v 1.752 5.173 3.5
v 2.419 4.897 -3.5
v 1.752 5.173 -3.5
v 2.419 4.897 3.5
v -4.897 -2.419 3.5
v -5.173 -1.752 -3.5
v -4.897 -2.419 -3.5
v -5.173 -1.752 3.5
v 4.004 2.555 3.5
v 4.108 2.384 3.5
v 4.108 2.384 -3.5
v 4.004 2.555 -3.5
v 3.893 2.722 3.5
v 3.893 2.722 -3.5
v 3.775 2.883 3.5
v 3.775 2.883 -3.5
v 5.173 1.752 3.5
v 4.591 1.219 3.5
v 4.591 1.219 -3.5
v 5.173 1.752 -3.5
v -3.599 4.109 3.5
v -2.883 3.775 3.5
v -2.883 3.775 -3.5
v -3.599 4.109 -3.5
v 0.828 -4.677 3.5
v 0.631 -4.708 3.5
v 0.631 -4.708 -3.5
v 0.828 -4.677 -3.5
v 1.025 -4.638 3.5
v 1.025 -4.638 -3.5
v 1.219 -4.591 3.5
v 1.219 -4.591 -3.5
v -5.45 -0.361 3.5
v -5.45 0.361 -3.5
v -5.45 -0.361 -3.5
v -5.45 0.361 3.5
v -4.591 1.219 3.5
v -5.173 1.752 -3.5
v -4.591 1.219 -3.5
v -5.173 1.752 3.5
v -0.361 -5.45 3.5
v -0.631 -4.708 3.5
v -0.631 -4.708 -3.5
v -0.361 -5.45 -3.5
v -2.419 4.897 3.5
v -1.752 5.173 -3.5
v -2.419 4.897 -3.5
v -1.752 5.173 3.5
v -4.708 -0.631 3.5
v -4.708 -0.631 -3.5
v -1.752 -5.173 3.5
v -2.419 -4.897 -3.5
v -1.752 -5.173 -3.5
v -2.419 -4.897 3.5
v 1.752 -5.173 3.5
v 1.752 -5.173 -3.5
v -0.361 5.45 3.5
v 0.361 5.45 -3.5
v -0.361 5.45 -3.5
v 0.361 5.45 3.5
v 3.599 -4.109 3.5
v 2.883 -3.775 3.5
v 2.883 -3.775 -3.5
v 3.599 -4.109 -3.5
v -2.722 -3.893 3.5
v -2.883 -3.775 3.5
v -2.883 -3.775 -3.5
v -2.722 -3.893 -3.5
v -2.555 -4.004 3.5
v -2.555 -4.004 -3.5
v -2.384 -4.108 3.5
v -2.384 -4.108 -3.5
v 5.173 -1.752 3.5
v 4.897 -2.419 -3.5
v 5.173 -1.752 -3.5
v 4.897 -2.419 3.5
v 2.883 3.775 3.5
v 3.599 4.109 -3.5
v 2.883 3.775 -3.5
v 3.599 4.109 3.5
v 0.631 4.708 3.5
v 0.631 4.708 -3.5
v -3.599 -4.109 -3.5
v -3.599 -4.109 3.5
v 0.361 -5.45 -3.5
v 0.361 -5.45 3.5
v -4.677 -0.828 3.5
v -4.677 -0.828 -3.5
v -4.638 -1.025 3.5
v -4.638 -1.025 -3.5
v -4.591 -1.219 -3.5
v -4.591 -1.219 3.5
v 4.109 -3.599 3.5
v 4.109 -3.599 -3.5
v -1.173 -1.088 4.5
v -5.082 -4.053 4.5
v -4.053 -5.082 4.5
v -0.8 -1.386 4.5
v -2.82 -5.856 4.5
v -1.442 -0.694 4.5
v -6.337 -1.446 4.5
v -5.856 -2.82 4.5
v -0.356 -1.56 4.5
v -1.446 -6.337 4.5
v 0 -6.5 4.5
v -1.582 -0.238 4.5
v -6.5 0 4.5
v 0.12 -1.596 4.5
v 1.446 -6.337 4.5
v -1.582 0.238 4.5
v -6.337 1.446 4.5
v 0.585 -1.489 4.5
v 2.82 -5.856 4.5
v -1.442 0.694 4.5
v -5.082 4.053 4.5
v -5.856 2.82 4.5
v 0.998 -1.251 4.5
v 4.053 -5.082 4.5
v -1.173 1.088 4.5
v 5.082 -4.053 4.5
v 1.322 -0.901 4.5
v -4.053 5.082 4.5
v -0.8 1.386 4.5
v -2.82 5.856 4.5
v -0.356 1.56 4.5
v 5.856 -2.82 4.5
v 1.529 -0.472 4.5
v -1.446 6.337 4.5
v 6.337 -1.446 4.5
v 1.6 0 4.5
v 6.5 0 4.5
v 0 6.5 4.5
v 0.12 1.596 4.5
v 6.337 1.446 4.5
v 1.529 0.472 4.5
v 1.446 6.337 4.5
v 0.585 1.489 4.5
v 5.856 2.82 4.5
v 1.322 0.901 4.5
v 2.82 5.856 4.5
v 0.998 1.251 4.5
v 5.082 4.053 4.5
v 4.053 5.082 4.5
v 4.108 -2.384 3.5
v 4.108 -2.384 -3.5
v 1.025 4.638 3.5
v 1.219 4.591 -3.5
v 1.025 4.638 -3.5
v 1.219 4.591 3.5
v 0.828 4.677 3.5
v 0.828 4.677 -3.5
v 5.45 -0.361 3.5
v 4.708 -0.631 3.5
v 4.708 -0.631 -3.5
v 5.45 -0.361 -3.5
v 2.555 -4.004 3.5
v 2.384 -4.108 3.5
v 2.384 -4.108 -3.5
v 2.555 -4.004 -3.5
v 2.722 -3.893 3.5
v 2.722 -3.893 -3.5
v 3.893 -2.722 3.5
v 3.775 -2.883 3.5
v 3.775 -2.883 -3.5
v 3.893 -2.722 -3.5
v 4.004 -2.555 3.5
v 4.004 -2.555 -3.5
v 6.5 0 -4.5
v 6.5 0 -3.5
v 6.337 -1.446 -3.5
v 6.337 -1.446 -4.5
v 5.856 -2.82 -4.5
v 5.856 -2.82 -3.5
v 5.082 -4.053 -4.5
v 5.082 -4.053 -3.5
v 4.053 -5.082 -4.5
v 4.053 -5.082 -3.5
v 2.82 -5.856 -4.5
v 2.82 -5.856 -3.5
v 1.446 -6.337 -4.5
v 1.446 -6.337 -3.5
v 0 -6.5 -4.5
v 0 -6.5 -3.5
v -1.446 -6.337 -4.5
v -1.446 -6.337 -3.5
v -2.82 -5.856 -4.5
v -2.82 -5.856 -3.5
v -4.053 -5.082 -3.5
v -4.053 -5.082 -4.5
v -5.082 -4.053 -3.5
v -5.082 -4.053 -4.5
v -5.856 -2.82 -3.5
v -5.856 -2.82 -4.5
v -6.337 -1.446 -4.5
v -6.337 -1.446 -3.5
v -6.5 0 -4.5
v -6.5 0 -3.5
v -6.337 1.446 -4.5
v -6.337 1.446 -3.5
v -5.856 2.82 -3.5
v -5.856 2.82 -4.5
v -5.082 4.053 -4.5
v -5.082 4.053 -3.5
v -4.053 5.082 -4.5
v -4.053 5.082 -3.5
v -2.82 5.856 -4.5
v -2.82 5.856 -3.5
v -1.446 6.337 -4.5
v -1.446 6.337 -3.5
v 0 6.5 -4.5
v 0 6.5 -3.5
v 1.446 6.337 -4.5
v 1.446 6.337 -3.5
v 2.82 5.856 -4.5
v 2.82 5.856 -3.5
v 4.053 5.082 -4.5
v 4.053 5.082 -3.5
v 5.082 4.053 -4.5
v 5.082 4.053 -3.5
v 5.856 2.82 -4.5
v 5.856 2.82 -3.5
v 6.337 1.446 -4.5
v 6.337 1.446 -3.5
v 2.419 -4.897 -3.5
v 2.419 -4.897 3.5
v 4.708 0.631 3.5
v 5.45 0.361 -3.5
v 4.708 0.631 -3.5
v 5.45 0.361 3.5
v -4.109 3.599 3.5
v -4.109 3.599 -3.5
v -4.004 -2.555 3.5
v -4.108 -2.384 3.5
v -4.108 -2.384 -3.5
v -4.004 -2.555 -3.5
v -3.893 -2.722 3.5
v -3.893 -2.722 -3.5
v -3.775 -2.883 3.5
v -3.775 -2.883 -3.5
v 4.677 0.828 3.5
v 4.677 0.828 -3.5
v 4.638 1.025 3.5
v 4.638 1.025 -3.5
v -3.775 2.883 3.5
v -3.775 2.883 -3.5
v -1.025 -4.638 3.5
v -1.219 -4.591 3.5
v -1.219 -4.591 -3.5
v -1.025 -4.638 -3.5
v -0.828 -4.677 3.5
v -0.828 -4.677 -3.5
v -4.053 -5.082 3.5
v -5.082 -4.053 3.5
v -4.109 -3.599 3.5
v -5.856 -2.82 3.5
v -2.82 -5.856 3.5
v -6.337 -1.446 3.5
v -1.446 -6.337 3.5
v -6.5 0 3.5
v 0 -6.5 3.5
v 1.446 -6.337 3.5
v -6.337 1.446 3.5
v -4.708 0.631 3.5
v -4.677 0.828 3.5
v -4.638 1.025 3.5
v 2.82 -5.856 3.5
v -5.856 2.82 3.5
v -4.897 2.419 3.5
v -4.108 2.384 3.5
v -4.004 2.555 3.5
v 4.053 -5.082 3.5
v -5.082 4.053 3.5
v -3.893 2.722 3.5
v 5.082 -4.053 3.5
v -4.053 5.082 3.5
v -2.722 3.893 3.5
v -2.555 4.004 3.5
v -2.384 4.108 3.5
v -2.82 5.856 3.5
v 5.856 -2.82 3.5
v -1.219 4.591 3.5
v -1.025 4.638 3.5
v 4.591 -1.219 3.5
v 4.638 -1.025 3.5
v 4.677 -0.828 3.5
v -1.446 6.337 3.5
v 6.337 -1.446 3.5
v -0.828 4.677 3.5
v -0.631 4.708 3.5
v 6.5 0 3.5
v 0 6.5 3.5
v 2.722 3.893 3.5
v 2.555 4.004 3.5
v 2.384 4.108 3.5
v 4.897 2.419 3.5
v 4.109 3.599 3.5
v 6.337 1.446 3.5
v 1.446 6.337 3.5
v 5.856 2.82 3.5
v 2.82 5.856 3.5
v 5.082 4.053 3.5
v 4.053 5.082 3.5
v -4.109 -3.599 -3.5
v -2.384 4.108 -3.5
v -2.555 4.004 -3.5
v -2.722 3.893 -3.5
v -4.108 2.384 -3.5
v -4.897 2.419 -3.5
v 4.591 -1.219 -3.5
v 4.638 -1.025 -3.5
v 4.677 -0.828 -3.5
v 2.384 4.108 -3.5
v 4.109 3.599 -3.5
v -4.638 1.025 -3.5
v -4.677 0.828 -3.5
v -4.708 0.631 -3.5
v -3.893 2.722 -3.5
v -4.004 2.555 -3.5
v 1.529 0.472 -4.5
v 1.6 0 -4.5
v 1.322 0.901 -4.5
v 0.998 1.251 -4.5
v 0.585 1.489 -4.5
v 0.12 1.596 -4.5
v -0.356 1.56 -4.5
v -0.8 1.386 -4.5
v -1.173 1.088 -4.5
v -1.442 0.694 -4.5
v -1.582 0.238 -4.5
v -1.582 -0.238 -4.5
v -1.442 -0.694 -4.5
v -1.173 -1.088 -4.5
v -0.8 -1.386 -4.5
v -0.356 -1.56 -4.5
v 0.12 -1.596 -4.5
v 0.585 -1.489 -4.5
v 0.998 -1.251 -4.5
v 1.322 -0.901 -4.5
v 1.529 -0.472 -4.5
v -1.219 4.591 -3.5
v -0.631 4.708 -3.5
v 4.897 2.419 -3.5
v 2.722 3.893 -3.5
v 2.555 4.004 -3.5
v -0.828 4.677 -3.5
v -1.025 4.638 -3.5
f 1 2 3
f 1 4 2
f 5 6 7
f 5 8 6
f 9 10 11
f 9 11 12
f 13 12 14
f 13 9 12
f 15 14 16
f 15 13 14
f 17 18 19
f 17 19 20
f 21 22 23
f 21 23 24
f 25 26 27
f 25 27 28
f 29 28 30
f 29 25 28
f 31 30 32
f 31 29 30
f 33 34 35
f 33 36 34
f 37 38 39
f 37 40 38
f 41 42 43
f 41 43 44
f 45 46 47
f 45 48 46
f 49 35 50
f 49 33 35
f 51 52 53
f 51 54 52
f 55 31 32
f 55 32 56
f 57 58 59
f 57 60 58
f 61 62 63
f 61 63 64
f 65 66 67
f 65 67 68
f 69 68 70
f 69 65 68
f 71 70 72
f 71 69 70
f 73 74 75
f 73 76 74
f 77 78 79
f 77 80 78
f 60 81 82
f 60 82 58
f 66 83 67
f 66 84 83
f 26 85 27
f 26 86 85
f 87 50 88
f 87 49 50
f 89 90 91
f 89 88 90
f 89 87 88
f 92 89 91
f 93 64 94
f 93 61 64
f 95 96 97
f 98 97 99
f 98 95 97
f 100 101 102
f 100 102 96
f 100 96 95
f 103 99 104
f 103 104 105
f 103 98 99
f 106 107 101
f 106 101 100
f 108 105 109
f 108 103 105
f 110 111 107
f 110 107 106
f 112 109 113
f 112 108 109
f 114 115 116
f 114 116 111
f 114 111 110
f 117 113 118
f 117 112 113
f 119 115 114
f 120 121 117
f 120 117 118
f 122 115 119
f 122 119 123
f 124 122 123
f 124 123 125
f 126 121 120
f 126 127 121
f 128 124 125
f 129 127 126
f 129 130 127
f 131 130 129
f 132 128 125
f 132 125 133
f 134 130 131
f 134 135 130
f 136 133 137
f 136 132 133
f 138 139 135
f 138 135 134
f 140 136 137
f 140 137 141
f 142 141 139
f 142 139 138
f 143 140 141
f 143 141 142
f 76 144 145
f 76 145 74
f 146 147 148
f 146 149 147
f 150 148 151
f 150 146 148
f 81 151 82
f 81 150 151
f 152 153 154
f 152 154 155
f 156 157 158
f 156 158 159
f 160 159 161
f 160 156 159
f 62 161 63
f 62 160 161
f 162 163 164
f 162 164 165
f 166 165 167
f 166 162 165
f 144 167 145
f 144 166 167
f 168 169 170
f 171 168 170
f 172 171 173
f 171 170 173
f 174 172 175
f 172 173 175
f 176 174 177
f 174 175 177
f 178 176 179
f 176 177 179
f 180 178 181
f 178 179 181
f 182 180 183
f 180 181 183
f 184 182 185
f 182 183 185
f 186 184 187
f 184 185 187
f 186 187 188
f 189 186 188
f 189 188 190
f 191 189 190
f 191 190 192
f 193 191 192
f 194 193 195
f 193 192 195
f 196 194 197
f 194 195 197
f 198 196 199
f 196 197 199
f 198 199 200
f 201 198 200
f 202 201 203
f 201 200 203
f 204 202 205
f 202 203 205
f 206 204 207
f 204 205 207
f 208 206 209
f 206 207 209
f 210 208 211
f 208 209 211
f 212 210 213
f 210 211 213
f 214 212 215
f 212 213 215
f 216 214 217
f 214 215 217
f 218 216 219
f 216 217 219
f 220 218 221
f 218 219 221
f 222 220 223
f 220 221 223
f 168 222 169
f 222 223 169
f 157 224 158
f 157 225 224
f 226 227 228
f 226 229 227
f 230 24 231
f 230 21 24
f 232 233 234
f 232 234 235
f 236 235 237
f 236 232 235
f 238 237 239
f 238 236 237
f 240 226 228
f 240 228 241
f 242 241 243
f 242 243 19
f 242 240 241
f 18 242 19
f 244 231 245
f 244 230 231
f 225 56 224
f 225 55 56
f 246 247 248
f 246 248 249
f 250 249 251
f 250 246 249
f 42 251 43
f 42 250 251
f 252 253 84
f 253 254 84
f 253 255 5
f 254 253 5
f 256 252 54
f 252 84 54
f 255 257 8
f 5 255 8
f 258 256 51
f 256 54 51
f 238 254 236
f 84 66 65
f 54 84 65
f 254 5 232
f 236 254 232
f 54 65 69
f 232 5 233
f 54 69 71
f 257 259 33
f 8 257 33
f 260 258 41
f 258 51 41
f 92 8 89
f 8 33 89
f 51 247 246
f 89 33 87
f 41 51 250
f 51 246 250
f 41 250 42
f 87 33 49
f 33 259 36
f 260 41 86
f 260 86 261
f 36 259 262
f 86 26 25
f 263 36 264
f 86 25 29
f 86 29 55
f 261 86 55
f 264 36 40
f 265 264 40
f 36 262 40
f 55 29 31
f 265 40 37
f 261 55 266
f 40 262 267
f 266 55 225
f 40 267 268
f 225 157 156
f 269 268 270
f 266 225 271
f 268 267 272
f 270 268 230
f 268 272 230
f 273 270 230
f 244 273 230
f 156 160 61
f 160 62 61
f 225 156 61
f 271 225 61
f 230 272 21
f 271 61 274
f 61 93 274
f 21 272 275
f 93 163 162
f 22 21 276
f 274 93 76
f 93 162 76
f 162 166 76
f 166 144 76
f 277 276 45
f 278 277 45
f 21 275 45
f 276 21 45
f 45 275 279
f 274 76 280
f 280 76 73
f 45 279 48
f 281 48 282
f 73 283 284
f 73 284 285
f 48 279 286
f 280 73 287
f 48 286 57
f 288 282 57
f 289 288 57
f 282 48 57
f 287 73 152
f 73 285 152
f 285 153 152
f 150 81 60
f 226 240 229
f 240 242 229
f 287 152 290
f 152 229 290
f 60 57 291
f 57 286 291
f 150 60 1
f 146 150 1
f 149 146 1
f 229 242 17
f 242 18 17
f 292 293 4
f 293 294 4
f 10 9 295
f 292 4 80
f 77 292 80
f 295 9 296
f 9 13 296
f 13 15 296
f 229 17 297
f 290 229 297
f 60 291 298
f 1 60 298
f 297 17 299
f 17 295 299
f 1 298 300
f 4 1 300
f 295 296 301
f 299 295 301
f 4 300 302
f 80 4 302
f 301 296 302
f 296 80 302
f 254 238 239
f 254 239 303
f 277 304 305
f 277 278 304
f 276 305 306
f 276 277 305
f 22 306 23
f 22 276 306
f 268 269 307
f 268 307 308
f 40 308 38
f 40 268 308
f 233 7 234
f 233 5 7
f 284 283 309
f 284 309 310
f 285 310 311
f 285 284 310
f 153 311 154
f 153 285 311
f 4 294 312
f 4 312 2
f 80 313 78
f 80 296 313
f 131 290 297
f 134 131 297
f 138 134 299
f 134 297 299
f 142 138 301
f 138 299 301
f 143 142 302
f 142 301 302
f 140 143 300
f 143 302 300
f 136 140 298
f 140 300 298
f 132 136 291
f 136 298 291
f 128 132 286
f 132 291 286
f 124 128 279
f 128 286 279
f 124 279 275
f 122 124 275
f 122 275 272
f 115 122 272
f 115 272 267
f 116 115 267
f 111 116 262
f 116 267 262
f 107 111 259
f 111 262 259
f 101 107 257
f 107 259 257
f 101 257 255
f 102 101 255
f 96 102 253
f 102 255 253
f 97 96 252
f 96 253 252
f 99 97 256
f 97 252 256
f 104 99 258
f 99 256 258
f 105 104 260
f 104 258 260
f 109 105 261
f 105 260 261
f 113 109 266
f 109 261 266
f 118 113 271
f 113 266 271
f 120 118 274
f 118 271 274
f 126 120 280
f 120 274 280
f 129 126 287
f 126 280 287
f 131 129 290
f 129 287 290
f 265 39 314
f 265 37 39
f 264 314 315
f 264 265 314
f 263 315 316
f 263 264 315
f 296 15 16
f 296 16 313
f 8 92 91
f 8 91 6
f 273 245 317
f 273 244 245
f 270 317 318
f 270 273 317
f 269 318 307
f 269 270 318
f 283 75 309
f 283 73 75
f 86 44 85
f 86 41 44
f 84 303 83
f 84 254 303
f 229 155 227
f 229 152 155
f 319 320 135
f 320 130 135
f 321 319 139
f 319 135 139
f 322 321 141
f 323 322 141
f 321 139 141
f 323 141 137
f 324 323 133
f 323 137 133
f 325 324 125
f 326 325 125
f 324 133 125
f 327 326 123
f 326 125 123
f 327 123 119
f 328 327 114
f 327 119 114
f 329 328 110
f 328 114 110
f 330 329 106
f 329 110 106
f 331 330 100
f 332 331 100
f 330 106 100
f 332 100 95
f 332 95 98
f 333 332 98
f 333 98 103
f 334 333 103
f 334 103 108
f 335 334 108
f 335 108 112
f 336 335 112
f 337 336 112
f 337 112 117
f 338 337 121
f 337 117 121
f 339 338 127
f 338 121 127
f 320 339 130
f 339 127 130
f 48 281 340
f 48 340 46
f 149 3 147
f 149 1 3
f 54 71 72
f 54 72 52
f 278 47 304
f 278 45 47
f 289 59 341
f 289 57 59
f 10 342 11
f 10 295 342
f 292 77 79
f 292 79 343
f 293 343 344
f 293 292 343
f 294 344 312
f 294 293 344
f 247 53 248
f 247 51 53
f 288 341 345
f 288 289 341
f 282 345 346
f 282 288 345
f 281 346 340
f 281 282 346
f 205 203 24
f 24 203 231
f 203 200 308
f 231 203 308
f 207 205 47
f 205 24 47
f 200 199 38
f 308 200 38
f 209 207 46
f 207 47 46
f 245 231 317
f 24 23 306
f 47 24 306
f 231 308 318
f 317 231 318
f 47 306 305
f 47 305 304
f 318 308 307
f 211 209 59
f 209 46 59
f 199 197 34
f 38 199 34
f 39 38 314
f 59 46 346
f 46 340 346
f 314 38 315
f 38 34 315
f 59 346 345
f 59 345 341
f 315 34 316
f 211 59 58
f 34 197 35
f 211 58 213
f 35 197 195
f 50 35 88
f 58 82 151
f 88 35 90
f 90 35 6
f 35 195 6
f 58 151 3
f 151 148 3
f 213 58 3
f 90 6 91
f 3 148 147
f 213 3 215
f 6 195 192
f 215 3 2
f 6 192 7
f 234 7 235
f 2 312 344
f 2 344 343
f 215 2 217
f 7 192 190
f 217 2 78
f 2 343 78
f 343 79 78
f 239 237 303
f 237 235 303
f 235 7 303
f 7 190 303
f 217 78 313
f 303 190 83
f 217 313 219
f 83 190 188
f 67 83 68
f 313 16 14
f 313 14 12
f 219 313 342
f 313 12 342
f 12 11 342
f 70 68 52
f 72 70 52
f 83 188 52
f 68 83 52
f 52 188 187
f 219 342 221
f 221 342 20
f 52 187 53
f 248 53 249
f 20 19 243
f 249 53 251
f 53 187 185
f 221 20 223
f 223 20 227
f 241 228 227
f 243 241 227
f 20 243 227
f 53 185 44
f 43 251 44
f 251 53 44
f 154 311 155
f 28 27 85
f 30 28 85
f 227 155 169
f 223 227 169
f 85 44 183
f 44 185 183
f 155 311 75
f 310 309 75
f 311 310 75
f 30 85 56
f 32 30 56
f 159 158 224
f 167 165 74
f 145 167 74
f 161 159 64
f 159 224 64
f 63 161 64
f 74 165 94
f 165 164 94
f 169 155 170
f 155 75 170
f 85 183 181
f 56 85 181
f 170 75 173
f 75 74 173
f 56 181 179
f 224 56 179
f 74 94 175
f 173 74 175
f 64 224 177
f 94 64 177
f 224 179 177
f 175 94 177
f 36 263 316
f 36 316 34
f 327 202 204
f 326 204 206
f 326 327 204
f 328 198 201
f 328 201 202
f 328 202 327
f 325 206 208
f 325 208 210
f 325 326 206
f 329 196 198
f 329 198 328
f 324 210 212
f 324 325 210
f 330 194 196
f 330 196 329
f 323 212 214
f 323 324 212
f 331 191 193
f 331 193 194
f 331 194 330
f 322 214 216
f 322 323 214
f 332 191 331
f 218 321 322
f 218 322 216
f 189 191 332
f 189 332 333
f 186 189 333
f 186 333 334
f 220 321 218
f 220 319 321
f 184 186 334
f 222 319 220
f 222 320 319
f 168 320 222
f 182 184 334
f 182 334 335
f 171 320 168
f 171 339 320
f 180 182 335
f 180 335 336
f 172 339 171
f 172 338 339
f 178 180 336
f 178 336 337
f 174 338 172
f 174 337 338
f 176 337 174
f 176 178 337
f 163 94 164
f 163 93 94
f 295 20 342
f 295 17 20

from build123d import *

# Parameters (mm, degrees)
F0_R     = 1.6
F1_DEPTH = 3.5
F3_COUNT = 16
F5_R     = 6.5
F6_DEPTH = 1
F7_R     = 6.5
F8_DEPTH = 1
F9_DEPTH = 12.5


with BuildPart() as f1:
    # F0 (on Top) → F1 (new body, symmetric)
    with BuildSketch(Plane.XY):
        with BuildLine():
            ThreePointArc((-0.6307960914, 4.7079290873), (-3.1277962342, -3.5748273689), (4.75, 0))
            ThreePointArc((4.75, 0), (3.5748273689, 3.1277962342), (0.6307960914, 4.7079290873))
            Line((0.6307960914, 4.7079290873), (0.75, 4.3804190402))
            Line((0.75, 4.3804190402), (-0.75, 4.3804190402))
            Line((-0.75, 4.3804190402), (-0.6307960914, 4.7079290873))
        make_face()
        Circle(F0_R, mode=Mode.SUBTRACT)
        with BuildLine():
            ThreePointArc((-0.6307960914, 4.7079290873), (0, 4.75), (0.6307960914, 4.7079290873))
            Line((0.6307960914, 4.7079290873), (0.3607043675, 5.45))
            Line((0.3607043675, 5.45), (-0.3607043675, 5.45))
            Line((-0.3607043675, 5.45), (-0.6307960914, 4.7079290873))
        make_face()
        with BuildLine():
            Line((0.75, 4.3804190402), (0.6307960914, 4.7079290873))
            ThreePointArc((0.6307960914, 4.7079290873), (0, 4.75), (-0.6307960914, 4.7079290873))
            Line((-0.6307960914, 4.7079290873), (-0.75, 4.3804190402))
            Line((-0.75, 4.3804190402), (0.75, 4.3804190402))
        make_face()
    extrude(amount=F1_DEPTH, both=True)


with BuildPart() as f3_1:
    # F3: instance of F1
    add(f1.part.rotate(Axis((0, 0, 0.113066053), (0, 0, -1)), 1 * 360 / F3_COUNT))


with BuildPart() as f3_2:
    # F3: instance of F1
    add(f1.part.rotate(Axis((0, 0, 0.113066053), (0, 0, -1)), 2 * 360 / F3_COUNT))


with BuildPart() as f3_3:
    # F3: instance of F1
    add(f1.part.rotate(Axis((0, 0, 0.113066053), (0, 0, -1)), 3 * 360 / F3_COUNT))


with BuildPart() as f3_4:
    # F3: instance of F1
    add(f1.part.rotate(Axis((0, 0, 0.113066053), (0, 0, -1)), 4 * 360 / F3_COUNT))


with BuildPart() as f3_5:
    # F3: instance of F1
    add(f1.part.rotate(Axis((0, 0, 0.113066053), (0, 0, -1)), 5 * 360 / F3_COUNT))


with BuildPart() as f3_6:
    # F3: instance of F1
    add(f1.part.rotate(Axis((0, 0, 0.113066053), (0, 0, -1)), 6 * 360 / F3_COUNT))


with BuildPart() as f3_7:
    # F3: instance of F1
    add(f1.part.rotate(Axis((0, 0, 0.113066053), (0, 0, -1)), 7 * 360 / F3_COUNT))


with BuildPart() as f3_8:
    # F3: instance of F1
    add(f1.part.rotate(Axis((0, 0, 0.113066053), (0, 0, -1)), 8 * 360 / F3_COUNT))


with BuildPart() as f3_9:
    # F3: instance of F1
    add(f1.part.rotate(Axis((0, 0, 0.113066053), (0, 0, -1)), 9 * 360 / F3_COUNT))


with BuildPart() as f3_10:
    # F3: instance of F1
    add(f1.part.rotate(Axis((0, 0, 0.113066053), (0, 0, -1)), 10 * 360 / F3_COUNT))


with BuildPart() as f3_11:
    # F3: instance of F1
    add(f1.part.rotate(Axis((0, 0, 0.113066053), (0, 0, -1)), 11 * 360 / F3_COUNT))


with BuildPart() as f3_12:
    # F3: instance of F1
    add(f1.part.rotate(Axis((0, 0, 0.113066053), (0, 0, -1)), 12 * 360 / F3_COUNT))


with BuildPart() as f3_13:
    # F3: instance of F1
    add(f1.part.rotate(Axis((0, 0, 0.113066053), (0, 0, -1)), 13 * 360 / F3_COUNT))


with BuildPart() as f3_14:
    # F3: instance of F1
    add(f1.part.rotate(Axis((0, 0, 0.113066053), (0, 0, -1)), 14 * 360 / F3_COUNT))


with BuildPart() as f3_15:
    # F3: instance of F1
    add(f1.part.rotate(Axis((0, 0, 0.113066053), (0, 0, -1)), 15 * 360 / F3_COUNT))


with BuildPart() as f3_1_1:
    add(f3_1.part)

    # F4: union F3_2, F3_3, F3_4, F3_5, F3_7, F3_9, F3_10, F3_8, F3_6, F3_11, F3_12, F3_14, F1, F3_13, F3_15
    add(f3_2.part)
    add(f3_3.part)
    add(f3_4.part)
    add(f3_5.part)
    add(f3_7.part)
    add(f3_9.part)
    add(f3_10.part)
    add(f3_8.part)
    add(f3_6.part)
    add(f3_11.part)
    add(f3_12.part)
    add(f3_14.part)
    add(f1.part)
    add(f3_13.part)
    add(f3_15.part)

    # F5 (on face) → F6 (join)
    with BuildSketch(Plane.XY.offset(3.5)):
        Circle(F5_R)
    extrude(amount=F6_DEPTH)

    # F7 (on face) → F8 (join)
    with BuildSketch(Plane(origin=(0, 0, -3.5), x_dir=(1, 0, 0), z_dir=(0, 0, -1))):
        Circle(F7_R)
    extrude(amount=F8_DEPTH)

    # F0 (on Top) → F9 (cut, symmetric)
    with BuildSketch(Plane.XY):
        Circle(F0_R)
    extrude(amount=F9_DEPTH, both=True, mode=Mode.SUBTRACT)


solid = f3_1_1.part
